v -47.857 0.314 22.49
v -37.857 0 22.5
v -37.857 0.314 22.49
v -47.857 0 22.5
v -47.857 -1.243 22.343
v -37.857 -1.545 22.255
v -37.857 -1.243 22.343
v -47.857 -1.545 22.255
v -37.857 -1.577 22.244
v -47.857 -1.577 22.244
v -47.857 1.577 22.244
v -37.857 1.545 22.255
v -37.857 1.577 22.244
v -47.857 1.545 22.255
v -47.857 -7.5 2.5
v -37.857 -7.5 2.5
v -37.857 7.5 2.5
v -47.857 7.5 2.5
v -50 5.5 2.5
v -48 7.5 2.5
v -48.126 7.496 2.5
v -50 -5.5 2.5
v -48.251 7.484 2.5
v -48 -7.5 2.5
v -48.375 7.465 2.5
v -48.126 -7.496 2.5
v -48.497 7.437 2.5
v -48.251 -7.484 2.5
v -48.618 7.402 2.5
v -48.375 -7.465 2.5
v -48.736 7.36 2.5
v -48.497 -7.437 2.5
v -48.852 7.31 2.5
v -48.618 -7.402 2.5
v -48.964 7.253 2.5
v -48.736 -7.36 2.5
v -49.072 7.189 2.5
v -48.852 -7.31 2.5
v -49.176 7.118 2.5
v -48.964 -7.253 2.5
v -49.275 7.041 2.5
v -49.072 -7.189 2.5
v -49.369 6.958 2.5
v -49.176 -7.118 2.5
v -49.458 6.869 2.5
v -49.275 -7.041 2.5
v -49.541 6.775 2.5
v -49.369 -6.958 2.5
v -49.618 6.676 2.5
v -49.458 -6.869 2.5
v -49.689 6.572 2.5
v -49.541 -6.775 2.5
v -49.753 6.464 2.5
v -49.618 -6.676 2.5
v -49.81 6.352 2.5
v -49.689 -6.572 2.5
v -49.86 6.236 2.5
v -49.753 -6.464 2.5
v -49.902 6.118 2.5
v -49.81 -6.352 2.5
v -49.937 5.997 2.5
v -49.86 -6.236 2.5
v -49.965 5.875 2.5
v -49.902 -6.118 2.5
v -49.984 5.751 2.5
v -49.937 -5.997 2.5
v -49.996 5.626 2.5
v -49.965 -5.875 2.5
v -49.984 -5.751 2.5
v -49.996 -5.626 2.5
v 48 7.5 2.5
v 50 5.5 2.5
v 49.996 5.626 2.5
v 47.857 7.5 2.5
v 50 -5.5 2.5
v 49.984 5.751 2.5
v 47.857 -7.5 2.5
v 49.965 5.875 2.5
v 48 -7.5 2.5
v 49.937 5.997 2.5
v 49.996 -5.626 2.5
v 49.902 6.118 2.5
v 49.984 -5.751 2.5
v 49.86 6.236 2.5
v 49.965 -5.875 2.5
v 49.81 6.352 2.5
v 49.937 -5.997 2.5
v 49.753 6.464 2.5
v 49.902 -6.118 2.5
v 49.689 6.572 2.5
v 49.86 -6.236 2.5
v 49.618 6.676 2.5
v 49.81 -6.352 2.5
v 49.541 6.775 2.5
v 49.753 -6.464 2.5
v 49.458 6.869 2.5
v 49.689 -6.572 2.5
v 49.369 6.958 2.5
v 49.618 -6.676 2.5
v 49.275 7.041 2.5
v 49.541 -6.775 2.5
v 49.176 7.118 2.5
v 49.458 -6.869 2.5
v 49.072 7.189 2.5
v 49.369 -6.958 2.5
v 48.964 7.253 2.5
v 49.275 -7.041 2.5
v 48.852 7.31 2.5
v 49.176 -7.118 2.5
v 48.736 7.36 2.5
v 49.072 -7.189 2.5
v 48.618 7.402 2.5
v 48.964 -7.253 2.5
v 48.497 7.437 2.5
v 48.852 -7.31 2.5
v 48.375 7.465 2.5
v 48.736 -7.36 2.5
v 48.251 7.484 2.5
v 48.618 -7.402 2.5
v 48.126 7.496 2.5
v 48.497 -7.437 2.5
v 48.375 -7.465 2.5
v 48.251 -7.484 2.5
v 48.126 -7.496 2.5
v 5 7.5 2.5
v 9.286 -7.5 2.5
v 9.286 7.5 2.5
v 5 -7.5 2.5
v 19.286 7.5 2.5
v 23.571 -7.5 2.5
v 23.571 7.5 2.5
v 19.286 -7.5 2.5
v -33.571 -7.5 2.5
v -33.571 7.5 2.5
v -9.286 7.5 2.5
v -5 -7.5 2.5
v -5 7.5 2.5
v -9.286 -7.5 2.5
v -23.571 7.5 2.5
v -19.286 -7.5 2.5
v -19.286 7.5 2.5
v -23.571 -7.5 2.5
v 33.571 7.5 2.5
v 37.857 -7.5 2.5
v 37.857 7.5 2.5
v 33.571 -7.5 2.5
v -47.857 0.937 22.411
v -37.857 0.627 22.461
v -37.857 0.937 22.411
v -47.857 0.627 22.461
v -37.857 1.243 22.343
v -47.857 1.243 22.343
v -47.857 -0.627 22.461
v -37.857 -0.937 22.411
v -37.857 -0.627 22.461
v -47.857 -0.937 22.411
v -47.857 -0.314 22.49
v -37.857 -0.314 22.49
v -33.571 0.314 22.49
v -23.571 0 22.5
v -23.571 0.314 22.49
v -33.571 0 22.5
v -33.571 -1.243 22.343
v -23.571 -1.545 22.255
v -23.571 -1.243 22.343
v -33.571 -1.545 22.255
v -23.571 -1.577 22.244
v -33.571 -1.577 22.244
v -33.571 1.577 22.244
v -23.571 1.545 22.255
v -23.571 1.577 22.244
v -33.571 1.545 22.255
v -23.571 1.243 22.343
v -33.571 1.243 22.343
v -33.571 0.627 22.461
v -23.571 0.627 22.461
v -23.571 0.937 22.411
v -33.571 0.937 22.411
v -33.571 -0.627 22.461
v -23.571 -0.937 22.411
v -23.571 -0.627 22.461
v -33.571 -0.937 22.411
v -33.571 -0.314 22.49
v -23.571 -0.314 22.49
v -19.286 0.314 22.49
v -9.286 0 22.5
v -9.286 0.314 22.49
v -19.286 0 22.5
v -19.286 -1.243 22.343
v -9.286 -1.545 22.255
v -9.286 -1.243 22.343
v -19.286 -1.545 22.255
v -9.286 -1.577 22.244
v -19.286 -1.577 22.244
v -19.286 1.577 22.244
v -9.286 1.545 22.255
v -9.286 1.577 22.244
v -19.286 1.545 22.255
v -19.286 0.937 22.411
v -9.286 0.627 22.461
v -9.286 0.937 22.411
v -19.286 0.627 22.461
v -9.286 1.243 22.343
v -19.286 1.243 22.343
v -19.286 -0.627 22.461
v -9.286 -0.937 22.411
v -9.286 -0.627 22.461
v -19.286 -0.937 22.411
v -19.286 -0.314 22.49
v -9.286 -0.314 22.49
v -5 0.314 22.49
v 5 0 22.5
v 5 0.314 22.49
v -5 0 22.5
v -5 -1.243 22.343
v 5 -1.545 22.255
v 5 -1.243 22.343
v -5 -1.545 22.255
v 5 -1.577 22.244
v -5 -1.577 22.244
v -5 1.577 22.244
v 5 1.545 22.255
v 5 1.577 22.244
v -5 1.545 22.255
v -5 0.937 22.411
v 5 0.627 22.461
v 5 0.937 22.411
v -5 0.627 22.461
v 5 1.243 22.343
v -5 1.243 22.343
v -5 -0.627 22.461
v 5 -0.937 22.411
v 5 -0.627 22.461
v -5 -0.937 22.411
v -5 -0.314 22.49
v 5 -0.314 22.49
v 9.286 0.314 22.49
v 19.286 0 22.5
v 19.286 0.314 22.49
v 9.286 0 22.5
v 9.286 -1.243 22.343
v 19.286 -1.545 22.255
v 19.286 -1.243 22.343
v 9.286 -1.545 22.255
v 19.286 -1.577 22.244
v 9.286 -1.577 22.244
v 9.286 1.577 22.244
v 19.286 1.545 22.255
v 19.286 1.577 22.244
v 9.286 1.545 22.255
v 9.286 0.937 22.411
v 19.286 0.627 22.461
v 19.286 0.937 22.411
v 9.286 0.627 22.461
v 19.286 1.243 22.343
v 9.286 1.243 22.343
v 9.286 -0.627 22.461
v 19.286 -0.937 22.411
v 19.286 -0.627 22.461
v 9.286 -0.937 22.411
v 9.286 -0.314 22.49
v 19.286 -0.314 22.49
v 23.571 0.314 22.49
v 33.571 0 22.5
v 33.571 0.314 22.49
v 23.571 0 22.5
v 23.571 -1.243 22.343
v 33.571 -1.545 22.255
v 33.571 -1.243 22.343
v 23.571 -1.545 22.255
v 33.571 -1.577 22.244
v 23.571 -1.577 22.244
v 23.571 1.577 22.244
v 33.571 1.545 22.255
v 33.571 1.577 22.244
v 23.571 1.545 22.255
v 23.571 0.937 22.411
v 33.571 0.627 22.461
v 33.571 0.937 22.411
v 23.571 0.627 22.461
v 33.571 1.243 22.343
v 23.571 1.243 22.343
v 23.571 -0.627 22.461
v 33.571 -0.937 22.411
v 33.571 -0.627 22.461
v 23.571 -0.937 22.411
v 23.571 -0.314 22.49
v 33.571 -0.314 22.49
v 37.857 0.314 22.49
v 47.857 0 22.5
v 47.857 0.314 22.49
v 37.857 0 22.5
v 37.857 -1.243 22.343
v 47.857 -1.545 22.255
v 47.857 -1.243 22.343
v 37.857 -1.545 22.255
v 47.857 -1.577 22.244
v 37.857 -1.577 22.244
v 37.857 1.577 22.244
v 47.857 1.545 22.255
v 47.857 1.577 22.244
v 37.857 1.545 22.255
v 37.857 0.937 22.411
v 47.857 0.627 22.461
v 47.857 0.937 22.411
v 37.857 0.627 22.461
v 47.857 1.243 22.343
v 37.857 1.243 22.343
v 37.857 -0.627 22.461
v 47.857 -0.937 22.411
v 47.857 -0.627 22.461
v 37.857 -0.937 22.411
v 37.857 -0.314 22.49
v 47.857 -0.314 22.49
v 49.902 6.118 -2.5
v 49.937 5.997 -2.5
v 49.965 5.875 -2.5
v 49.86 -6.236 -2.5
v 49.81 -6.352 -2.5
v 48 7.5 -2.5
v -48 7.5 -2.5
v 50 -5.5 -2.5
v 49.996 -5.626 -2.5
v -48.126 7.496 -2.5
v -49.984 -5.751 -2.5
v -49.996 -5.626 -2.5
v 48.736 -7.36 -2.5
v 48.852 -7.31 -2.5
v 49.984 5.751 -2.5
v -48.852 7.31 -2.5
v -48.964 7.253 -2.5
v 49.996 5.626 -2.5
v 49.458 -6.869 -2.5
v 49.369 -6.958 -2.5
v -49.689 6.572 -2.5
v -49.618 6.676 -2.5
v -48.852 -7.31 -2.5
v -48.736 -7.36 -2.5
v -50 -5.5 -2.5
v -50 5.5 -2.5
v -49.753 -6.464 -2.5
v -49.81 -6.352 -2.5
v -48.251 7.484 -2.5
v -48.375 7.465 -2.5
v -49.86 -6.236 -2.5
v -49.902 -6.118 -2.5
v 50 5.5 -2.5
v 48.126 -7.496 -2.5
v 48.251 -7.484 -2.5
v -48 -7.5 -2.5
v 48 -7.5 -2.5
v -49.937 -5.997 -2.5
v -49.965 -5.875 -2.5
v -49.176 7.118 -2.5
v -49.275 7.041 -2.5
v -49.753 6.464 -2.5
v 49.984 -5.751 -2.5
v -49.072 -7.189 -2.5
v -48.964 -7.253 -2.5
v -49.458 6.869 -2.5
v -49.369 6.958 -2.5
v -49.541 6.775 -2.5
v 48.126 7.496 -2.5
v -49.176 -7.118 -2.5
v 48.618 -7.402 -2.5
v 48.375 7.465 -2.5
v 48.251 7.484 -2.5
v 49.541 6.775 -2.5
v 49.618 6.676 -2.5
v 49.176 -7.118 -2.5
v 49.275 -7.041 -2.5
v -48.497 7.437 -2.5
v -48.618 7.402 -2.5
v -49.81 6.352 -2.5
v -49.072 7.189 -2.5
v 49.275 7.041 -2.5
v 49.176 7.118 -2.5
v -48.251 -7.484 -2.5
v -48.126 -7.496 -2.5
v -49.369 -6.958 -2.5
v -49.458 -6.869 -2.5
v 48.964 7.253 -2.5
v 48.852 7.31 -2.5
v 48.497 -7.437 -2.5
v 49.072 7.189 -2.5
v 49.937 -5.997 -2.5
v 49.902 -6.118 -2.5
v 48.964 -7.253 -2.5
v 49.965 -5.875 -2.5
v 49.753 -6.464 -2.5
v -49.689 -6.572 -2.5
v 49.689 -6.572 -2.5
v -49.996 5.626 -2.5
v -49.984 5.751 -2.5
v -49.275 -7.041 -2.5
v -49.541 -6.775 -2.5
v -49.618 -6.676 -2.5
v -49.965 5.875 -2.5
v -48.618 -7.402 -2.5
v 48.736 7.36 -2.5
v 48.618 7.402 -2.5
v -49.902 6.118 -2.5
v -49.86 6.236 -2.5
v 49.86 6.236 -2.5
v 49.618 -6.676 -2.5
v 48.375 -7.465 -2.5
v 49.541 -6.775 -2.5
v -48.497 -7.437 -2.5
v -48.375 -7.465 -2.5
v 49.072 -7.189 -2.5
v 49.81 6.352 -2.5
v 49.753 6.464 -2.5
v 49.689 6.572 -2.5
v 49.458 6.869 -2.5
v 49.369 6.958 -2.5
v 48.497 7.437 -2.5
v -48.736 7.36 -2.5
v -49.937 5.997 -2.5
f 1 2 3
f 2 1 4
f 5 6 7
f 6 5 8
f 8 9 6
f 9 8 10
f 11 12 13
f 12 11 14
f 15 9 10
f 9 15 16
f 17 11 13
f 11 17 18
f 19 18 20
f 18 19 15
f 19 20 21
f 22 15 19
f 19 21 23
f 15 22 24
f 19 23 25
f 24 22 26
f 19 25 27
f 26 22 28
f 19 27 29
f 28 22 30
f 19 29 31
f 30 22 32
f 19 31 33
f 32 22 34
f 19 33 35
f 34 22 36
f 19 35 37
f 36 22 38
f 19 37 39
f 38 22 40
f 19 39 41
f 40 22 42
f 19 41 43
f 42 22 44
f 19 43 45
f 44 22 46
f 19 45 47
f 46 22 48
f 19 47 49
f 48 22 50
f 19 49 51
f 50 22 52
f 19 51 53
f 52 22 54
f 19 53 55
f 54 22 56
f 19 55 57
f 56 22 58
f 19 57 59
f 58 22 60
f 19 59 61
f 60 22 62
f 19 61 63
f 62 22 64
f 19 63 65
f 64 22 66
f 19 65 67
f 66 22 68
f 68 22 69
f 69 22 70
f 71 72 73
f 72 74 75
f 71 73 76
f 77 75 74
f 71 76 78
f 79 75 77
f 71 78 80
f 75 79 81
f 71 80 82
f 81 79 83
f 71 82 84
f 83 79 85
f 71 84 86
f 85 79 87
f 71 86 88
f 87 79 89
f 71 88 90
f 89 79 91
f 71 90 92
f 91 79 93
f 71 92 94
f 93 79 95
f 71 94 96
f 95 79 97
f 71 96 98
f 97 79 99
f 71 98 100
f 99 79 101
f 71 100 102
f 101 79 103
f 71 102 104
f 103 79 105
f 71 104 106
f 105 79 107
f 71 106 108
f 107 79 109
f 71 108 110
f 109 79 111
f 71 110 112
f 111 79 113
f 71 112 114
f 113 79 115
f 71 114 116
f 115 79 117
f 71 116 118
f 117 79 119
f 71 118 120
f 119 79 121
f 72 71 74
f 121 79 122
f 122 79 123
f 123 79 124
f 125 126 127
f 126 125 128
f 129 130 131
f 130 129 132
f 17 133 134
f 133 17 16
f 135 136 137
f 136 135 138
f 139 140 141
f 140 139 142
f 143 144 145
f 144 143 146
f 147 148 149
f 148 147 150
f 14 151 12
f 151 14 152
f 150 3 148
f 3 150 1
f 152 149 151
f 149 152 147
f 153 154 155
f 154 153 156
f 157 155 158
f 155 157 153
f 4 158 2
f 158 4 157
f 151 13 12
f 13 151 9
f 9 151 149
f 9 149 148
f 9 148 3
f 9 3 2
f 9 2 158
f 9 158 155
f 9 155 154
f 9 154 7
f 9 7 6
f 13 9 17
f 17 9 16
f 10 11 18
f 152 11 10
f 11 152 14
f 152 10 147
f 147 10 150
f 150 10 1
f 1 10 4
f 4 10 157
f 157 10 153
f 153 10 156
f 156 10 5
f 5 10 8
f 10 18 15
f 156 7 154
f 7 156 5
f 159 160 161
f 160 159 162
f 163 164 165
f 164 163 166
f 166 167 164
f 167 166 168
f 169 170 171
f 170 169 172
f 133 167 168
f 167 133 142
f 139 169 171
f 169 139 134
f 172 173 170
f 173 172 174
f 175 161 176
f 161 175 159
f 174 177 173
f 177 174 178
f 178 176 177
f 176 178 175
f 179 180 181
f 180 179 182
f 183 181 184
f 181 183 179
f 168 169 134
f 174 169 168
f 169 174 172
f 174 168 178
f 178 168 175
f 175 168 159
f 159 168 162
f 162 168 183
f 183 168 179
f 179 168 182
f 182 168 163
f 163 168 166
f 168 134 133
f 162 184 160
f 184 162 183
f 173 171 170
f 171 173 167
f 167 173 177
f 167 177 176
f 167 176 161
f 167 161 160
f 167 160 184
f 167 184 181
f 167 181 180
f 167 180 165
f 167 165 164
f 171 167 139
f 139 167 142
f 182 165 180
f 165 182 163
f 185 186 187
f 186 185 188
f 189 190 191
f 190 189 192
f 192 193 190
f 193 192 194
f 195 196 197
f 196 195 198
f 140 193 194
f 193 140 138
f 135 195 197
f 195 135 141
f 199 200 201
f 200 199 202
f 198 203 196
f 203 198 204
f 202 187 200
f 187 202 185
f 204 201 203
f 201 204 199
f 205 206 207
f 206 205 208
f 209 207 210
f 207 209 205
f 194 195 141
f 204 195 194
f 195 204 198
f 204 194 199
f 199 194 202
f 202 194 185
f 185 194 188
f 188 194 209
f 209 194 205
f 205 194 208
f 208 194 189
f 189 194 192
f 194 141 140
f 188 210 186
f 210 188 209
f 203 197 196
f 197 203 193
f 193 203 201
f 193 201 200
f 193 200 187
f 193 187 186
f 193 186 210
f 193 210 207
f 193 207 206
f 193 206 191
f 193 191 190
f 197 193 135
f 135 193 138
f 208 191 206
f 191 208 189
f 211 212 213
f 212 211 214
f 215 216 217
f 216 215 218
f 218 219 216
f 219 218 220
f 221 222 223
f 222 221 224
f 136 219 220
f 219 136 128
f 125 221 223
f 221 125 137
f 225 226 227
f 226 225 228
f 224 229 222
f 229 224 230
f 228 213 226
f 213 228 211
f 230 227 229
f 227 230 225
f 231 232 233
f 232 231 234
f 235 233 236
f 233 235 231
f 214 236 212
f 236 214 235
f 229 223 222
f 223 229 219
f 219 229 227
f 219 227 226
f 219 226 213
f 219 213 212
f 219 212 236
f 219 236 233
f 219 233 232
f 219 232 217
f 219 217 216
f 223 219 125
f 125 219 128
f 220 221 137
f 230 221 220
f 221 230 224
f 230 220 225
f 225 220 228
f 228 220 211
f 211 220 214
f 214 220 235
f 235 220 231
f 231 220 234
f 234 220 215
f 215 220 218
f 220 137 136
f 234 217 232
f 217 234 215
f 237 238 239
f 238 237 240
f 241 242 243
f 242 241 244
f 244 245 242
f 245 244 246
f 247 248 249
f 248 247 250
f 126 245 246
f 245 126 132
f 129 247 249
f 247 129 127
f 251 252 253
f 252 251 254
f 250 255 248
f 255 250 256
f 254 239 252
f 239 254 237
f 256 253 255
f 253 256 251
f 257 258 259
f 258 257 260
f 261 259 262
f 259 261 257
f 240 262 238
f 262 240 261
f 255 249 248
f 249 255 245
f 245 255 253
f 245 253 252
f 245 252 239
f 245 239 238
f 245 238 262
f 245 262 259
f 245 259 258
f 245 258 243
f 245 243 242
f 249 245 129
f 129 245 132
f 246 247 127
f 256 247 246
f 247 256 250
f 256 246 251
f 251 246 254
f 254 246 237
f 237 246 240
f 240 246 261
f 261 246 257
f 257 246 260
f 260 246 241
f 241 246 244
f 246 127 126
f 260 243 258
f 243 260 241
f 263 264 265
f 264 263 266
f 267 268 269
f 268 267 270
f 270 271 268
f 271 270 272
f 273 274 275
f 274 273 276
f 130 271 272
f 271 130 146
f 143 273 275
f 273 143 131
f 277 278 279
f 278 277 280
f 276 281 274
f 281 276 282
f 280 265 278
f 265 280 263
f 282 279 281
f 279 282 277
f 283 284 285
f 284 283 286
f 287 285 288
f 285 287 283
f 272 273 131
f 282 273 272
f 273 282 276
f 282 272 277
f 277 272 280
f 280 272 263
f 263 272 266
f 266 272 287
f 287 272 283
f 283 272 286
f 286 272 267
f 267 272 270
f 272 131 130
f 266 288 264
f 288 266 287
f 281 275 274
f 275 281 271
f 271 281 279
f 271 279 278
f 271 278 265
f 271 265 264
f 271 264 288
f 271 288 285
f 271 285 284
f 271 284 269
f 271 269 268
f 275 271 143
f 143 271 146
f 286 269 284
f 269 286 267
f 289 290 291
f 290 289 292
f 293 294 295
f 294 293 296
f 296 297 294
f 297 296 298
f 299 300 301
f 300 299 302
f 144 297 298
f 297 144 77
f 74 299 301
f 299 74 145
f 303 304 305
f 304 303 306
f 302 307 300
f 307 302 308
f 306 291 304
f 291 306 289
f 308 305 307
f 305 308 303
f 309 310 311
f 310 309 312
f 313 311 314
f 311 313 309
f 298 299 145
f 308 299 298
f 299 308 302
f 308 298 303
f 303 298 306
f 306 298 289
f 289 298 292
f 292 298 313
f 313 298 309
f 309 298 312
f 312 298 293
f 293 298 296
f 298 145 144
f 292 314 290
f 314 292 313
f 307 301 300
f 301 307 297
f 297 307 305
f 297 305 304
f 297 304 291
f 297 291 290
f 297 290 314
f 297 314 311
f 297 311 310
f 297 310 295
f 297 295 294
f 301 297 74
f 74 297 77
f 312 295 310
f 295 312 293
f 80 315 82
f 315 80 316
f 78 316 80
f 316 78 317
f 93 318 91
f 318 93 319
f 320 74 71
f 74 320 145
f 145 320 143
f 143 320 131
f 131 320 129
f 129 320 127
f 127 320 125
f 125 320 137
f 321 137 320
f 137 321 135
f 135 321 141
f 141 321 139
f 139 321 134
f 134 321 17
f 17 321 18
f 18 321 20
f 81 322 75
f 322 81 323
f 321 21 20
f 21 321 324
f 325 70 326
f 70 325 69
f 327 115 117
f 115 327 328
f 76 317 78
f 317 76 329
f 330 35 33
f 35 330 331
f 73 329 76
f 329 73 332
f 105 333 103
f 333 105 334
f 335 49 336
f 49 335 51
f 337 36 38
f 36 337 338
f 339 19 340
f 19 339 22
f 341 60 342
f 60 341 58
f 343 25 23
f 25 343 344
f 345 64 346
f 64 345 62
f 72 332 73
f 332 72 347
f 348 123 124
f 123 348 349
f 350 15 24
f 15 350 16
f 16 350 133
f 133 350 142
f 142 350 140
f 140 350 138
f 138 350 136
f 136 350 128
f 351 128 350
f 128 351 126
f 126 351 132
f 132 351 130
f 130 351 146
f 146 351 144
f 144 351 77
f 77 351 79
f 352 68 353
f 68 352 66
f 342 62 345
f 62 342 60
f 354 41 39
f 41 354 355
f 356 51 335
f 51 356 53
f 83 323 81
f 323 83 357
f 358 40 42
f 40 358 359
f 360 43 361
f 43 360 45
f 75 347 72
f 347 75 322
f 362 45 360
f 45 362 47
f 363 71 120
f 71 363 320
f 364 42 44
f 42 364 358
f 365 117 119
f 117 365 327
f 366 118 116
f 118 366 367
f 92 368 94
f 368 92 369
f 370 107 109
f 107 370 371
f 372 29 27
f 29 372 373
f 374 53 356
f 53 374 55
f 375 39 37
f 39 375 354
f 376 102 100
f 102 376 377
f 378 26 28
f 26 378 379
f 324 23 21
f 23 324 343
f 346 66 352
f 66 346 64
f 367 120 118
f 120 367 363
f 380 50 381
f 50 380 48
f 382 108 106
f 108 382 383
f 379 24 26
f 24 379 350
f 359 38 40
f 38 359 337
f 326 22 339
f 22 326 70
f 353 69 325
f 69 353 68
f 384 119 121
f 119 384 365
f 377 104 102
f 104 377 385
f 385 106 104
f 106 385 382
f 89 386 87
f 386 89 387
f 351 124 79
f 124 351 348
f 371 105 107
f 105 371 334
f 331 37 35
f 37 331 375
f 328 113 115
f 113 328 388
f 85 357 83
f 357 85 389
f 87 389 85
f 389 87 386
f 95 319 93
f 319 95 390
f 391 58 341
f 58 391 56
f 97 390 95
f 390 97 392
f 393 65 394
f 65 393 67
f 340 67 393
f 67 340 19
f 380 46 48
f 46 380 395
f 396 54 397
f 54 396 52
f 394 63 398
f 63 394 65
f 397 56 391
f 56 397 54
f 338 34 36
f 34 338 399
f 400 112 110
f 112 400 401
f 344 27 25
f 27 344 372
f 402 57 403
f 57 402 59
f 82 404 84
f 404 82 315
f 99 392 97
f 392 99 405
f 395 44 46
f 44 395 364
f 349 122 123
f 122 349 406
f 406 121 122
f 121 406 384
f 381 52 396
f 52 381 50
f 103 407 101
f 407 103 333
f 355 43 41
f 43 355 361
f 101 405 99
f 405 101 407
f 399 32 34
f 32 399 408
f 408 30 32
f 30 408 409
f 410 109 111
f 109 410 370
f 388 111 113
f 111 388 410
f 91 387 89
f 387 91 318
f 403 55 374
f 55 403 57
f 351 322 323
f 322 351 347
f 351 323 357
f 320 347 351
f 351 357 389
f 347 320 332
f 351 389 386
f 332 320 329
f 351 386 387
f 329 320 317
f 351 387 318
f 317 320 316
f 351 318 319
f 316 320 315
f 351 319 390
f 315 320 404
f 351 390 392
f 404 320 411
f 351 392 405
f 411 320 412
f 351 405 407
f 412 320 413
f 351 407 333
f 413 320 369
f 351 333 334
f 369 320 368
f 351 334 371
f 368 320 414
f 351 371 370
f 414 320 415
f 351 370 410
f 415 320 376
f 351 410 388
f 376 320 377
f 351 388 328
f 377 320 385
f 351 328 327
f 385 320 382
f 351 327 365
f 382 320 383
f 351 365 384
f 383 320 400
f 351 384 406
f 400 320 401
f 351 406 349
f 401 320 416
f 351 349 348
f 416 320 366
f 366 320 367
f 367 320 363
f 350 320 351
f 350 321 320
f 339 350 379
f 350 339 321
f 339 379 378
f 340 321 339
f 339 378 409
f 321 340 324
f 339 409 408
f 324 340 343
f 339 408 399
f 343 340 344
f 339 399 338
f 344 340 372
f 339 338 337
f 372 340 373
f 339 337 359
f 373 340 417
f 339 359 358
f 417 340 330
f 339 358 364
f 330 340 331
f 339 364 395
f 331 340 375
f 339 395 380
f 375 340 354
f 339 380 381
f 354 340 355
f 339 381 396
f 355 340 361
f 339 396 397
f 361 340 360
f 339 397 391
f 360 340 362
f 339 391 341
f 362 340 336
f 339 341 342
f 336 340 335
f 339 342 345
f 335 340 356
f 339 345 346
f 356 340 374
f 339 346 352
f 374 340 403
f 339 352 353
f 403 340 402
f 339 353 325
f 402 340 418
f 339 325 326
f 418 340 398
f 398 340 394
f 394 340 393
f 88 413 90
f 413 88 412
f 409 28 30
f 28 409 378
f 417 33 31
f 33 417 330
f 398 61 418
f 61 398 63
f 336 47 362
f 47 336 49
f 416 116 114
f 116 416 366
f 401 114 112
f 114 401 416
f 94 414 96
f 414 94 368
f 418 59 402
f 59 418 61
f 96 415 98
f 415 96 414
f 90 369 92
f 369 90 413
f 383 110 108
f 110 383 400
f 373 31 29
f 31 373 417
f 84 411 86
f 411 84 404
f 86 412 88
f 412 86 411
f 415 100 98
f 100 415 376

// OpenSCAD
// Customizable Knife Holder
// Copyright: Olle Wreede 2019
// License: CC BY-SA

//CUSTOMIZER VARIABLES

// Width in mm of knife holder base
width_of_base = 15; // [10:1:30]

// Length in mm of knife holder base
length_of_base = 100; // [100:10:250]

// Height in mm of knife holder base
height_of_base = 5; // [3:0.5:8]

// Radius of corners of base in mm
radius_of_base_corners = 2; // [0:0.2:5]

// Height in mm of dividers
height_of_divider = 25; // [15:1:30]

// Thickness in mm of dividers
thickness_of_divider = 10; // [2:1:20]

// Number of dividers
number_of_dividers = 7; // [5:20]

// Radius of rounded tip of divider
radius_of_divider_tip = 5; // [0:0.5:15]

//CUSTOMIZER VARIABLES END

/* [Hidden] */

$fn = 100;

module rectangle_rounded(width, height, radius=1) {
	minkowski() {
		circle(r = radius);
		square([width - 2 * radius, height - 2 * radius], center = true);
	}
}

module triangle(height, width) {
    polygon(points = [
        [0, 0],
        [height, width / 2],
        [0, width]
    ]);
}

module rounded_triangle(height, width, radius=2) {
    difference() {
        triangle(height, width);
        
        translate([height - radius * 2, width/2, 0])
        difference() {
            translate([radius, 0, 0])
            square([radius * 2, radius * 2], center = true);
            circle(r = radius);
        }
    }
}

module base(width, length, height, radius) {
    linear_extrude(height = height, center = true)
    rectangle_rounded(length, width, radius);
}

module divider(height, width, thickness, tip_radius) {
    translate([0, -width / 2, 0])
    rotate([0, -90, 0])
    linear_extrude(height = thickness, center = true)
    rounded_triangle(height, width, tip_radius);
}

module dividers(width, length, height, thickness, number, tip_radius) {
    divider_distance = (length - number * thickness) / number;
    translate([ - (length - divider_distance) / 2 + thickness / 2, 0, 0])
    for(position = [0 : divider_distance + thickness : length - divider_distance])
        translate([position, 0, 0])
        divider(height, width, thickness, tip_radius);
}

module knife_holder() {
    union() {
        base(width=width_of_base, length=length_of_base, height=height_of_base, radius=radius_of_base_corners);
        translate([0, 0, height_of_base/2])
        dividers(width_of_base, length_of_base, height_of_divider, thickness_of_divider, number_of_dividers, radius_of_divider_tip);
    }
}

knife_holder();
